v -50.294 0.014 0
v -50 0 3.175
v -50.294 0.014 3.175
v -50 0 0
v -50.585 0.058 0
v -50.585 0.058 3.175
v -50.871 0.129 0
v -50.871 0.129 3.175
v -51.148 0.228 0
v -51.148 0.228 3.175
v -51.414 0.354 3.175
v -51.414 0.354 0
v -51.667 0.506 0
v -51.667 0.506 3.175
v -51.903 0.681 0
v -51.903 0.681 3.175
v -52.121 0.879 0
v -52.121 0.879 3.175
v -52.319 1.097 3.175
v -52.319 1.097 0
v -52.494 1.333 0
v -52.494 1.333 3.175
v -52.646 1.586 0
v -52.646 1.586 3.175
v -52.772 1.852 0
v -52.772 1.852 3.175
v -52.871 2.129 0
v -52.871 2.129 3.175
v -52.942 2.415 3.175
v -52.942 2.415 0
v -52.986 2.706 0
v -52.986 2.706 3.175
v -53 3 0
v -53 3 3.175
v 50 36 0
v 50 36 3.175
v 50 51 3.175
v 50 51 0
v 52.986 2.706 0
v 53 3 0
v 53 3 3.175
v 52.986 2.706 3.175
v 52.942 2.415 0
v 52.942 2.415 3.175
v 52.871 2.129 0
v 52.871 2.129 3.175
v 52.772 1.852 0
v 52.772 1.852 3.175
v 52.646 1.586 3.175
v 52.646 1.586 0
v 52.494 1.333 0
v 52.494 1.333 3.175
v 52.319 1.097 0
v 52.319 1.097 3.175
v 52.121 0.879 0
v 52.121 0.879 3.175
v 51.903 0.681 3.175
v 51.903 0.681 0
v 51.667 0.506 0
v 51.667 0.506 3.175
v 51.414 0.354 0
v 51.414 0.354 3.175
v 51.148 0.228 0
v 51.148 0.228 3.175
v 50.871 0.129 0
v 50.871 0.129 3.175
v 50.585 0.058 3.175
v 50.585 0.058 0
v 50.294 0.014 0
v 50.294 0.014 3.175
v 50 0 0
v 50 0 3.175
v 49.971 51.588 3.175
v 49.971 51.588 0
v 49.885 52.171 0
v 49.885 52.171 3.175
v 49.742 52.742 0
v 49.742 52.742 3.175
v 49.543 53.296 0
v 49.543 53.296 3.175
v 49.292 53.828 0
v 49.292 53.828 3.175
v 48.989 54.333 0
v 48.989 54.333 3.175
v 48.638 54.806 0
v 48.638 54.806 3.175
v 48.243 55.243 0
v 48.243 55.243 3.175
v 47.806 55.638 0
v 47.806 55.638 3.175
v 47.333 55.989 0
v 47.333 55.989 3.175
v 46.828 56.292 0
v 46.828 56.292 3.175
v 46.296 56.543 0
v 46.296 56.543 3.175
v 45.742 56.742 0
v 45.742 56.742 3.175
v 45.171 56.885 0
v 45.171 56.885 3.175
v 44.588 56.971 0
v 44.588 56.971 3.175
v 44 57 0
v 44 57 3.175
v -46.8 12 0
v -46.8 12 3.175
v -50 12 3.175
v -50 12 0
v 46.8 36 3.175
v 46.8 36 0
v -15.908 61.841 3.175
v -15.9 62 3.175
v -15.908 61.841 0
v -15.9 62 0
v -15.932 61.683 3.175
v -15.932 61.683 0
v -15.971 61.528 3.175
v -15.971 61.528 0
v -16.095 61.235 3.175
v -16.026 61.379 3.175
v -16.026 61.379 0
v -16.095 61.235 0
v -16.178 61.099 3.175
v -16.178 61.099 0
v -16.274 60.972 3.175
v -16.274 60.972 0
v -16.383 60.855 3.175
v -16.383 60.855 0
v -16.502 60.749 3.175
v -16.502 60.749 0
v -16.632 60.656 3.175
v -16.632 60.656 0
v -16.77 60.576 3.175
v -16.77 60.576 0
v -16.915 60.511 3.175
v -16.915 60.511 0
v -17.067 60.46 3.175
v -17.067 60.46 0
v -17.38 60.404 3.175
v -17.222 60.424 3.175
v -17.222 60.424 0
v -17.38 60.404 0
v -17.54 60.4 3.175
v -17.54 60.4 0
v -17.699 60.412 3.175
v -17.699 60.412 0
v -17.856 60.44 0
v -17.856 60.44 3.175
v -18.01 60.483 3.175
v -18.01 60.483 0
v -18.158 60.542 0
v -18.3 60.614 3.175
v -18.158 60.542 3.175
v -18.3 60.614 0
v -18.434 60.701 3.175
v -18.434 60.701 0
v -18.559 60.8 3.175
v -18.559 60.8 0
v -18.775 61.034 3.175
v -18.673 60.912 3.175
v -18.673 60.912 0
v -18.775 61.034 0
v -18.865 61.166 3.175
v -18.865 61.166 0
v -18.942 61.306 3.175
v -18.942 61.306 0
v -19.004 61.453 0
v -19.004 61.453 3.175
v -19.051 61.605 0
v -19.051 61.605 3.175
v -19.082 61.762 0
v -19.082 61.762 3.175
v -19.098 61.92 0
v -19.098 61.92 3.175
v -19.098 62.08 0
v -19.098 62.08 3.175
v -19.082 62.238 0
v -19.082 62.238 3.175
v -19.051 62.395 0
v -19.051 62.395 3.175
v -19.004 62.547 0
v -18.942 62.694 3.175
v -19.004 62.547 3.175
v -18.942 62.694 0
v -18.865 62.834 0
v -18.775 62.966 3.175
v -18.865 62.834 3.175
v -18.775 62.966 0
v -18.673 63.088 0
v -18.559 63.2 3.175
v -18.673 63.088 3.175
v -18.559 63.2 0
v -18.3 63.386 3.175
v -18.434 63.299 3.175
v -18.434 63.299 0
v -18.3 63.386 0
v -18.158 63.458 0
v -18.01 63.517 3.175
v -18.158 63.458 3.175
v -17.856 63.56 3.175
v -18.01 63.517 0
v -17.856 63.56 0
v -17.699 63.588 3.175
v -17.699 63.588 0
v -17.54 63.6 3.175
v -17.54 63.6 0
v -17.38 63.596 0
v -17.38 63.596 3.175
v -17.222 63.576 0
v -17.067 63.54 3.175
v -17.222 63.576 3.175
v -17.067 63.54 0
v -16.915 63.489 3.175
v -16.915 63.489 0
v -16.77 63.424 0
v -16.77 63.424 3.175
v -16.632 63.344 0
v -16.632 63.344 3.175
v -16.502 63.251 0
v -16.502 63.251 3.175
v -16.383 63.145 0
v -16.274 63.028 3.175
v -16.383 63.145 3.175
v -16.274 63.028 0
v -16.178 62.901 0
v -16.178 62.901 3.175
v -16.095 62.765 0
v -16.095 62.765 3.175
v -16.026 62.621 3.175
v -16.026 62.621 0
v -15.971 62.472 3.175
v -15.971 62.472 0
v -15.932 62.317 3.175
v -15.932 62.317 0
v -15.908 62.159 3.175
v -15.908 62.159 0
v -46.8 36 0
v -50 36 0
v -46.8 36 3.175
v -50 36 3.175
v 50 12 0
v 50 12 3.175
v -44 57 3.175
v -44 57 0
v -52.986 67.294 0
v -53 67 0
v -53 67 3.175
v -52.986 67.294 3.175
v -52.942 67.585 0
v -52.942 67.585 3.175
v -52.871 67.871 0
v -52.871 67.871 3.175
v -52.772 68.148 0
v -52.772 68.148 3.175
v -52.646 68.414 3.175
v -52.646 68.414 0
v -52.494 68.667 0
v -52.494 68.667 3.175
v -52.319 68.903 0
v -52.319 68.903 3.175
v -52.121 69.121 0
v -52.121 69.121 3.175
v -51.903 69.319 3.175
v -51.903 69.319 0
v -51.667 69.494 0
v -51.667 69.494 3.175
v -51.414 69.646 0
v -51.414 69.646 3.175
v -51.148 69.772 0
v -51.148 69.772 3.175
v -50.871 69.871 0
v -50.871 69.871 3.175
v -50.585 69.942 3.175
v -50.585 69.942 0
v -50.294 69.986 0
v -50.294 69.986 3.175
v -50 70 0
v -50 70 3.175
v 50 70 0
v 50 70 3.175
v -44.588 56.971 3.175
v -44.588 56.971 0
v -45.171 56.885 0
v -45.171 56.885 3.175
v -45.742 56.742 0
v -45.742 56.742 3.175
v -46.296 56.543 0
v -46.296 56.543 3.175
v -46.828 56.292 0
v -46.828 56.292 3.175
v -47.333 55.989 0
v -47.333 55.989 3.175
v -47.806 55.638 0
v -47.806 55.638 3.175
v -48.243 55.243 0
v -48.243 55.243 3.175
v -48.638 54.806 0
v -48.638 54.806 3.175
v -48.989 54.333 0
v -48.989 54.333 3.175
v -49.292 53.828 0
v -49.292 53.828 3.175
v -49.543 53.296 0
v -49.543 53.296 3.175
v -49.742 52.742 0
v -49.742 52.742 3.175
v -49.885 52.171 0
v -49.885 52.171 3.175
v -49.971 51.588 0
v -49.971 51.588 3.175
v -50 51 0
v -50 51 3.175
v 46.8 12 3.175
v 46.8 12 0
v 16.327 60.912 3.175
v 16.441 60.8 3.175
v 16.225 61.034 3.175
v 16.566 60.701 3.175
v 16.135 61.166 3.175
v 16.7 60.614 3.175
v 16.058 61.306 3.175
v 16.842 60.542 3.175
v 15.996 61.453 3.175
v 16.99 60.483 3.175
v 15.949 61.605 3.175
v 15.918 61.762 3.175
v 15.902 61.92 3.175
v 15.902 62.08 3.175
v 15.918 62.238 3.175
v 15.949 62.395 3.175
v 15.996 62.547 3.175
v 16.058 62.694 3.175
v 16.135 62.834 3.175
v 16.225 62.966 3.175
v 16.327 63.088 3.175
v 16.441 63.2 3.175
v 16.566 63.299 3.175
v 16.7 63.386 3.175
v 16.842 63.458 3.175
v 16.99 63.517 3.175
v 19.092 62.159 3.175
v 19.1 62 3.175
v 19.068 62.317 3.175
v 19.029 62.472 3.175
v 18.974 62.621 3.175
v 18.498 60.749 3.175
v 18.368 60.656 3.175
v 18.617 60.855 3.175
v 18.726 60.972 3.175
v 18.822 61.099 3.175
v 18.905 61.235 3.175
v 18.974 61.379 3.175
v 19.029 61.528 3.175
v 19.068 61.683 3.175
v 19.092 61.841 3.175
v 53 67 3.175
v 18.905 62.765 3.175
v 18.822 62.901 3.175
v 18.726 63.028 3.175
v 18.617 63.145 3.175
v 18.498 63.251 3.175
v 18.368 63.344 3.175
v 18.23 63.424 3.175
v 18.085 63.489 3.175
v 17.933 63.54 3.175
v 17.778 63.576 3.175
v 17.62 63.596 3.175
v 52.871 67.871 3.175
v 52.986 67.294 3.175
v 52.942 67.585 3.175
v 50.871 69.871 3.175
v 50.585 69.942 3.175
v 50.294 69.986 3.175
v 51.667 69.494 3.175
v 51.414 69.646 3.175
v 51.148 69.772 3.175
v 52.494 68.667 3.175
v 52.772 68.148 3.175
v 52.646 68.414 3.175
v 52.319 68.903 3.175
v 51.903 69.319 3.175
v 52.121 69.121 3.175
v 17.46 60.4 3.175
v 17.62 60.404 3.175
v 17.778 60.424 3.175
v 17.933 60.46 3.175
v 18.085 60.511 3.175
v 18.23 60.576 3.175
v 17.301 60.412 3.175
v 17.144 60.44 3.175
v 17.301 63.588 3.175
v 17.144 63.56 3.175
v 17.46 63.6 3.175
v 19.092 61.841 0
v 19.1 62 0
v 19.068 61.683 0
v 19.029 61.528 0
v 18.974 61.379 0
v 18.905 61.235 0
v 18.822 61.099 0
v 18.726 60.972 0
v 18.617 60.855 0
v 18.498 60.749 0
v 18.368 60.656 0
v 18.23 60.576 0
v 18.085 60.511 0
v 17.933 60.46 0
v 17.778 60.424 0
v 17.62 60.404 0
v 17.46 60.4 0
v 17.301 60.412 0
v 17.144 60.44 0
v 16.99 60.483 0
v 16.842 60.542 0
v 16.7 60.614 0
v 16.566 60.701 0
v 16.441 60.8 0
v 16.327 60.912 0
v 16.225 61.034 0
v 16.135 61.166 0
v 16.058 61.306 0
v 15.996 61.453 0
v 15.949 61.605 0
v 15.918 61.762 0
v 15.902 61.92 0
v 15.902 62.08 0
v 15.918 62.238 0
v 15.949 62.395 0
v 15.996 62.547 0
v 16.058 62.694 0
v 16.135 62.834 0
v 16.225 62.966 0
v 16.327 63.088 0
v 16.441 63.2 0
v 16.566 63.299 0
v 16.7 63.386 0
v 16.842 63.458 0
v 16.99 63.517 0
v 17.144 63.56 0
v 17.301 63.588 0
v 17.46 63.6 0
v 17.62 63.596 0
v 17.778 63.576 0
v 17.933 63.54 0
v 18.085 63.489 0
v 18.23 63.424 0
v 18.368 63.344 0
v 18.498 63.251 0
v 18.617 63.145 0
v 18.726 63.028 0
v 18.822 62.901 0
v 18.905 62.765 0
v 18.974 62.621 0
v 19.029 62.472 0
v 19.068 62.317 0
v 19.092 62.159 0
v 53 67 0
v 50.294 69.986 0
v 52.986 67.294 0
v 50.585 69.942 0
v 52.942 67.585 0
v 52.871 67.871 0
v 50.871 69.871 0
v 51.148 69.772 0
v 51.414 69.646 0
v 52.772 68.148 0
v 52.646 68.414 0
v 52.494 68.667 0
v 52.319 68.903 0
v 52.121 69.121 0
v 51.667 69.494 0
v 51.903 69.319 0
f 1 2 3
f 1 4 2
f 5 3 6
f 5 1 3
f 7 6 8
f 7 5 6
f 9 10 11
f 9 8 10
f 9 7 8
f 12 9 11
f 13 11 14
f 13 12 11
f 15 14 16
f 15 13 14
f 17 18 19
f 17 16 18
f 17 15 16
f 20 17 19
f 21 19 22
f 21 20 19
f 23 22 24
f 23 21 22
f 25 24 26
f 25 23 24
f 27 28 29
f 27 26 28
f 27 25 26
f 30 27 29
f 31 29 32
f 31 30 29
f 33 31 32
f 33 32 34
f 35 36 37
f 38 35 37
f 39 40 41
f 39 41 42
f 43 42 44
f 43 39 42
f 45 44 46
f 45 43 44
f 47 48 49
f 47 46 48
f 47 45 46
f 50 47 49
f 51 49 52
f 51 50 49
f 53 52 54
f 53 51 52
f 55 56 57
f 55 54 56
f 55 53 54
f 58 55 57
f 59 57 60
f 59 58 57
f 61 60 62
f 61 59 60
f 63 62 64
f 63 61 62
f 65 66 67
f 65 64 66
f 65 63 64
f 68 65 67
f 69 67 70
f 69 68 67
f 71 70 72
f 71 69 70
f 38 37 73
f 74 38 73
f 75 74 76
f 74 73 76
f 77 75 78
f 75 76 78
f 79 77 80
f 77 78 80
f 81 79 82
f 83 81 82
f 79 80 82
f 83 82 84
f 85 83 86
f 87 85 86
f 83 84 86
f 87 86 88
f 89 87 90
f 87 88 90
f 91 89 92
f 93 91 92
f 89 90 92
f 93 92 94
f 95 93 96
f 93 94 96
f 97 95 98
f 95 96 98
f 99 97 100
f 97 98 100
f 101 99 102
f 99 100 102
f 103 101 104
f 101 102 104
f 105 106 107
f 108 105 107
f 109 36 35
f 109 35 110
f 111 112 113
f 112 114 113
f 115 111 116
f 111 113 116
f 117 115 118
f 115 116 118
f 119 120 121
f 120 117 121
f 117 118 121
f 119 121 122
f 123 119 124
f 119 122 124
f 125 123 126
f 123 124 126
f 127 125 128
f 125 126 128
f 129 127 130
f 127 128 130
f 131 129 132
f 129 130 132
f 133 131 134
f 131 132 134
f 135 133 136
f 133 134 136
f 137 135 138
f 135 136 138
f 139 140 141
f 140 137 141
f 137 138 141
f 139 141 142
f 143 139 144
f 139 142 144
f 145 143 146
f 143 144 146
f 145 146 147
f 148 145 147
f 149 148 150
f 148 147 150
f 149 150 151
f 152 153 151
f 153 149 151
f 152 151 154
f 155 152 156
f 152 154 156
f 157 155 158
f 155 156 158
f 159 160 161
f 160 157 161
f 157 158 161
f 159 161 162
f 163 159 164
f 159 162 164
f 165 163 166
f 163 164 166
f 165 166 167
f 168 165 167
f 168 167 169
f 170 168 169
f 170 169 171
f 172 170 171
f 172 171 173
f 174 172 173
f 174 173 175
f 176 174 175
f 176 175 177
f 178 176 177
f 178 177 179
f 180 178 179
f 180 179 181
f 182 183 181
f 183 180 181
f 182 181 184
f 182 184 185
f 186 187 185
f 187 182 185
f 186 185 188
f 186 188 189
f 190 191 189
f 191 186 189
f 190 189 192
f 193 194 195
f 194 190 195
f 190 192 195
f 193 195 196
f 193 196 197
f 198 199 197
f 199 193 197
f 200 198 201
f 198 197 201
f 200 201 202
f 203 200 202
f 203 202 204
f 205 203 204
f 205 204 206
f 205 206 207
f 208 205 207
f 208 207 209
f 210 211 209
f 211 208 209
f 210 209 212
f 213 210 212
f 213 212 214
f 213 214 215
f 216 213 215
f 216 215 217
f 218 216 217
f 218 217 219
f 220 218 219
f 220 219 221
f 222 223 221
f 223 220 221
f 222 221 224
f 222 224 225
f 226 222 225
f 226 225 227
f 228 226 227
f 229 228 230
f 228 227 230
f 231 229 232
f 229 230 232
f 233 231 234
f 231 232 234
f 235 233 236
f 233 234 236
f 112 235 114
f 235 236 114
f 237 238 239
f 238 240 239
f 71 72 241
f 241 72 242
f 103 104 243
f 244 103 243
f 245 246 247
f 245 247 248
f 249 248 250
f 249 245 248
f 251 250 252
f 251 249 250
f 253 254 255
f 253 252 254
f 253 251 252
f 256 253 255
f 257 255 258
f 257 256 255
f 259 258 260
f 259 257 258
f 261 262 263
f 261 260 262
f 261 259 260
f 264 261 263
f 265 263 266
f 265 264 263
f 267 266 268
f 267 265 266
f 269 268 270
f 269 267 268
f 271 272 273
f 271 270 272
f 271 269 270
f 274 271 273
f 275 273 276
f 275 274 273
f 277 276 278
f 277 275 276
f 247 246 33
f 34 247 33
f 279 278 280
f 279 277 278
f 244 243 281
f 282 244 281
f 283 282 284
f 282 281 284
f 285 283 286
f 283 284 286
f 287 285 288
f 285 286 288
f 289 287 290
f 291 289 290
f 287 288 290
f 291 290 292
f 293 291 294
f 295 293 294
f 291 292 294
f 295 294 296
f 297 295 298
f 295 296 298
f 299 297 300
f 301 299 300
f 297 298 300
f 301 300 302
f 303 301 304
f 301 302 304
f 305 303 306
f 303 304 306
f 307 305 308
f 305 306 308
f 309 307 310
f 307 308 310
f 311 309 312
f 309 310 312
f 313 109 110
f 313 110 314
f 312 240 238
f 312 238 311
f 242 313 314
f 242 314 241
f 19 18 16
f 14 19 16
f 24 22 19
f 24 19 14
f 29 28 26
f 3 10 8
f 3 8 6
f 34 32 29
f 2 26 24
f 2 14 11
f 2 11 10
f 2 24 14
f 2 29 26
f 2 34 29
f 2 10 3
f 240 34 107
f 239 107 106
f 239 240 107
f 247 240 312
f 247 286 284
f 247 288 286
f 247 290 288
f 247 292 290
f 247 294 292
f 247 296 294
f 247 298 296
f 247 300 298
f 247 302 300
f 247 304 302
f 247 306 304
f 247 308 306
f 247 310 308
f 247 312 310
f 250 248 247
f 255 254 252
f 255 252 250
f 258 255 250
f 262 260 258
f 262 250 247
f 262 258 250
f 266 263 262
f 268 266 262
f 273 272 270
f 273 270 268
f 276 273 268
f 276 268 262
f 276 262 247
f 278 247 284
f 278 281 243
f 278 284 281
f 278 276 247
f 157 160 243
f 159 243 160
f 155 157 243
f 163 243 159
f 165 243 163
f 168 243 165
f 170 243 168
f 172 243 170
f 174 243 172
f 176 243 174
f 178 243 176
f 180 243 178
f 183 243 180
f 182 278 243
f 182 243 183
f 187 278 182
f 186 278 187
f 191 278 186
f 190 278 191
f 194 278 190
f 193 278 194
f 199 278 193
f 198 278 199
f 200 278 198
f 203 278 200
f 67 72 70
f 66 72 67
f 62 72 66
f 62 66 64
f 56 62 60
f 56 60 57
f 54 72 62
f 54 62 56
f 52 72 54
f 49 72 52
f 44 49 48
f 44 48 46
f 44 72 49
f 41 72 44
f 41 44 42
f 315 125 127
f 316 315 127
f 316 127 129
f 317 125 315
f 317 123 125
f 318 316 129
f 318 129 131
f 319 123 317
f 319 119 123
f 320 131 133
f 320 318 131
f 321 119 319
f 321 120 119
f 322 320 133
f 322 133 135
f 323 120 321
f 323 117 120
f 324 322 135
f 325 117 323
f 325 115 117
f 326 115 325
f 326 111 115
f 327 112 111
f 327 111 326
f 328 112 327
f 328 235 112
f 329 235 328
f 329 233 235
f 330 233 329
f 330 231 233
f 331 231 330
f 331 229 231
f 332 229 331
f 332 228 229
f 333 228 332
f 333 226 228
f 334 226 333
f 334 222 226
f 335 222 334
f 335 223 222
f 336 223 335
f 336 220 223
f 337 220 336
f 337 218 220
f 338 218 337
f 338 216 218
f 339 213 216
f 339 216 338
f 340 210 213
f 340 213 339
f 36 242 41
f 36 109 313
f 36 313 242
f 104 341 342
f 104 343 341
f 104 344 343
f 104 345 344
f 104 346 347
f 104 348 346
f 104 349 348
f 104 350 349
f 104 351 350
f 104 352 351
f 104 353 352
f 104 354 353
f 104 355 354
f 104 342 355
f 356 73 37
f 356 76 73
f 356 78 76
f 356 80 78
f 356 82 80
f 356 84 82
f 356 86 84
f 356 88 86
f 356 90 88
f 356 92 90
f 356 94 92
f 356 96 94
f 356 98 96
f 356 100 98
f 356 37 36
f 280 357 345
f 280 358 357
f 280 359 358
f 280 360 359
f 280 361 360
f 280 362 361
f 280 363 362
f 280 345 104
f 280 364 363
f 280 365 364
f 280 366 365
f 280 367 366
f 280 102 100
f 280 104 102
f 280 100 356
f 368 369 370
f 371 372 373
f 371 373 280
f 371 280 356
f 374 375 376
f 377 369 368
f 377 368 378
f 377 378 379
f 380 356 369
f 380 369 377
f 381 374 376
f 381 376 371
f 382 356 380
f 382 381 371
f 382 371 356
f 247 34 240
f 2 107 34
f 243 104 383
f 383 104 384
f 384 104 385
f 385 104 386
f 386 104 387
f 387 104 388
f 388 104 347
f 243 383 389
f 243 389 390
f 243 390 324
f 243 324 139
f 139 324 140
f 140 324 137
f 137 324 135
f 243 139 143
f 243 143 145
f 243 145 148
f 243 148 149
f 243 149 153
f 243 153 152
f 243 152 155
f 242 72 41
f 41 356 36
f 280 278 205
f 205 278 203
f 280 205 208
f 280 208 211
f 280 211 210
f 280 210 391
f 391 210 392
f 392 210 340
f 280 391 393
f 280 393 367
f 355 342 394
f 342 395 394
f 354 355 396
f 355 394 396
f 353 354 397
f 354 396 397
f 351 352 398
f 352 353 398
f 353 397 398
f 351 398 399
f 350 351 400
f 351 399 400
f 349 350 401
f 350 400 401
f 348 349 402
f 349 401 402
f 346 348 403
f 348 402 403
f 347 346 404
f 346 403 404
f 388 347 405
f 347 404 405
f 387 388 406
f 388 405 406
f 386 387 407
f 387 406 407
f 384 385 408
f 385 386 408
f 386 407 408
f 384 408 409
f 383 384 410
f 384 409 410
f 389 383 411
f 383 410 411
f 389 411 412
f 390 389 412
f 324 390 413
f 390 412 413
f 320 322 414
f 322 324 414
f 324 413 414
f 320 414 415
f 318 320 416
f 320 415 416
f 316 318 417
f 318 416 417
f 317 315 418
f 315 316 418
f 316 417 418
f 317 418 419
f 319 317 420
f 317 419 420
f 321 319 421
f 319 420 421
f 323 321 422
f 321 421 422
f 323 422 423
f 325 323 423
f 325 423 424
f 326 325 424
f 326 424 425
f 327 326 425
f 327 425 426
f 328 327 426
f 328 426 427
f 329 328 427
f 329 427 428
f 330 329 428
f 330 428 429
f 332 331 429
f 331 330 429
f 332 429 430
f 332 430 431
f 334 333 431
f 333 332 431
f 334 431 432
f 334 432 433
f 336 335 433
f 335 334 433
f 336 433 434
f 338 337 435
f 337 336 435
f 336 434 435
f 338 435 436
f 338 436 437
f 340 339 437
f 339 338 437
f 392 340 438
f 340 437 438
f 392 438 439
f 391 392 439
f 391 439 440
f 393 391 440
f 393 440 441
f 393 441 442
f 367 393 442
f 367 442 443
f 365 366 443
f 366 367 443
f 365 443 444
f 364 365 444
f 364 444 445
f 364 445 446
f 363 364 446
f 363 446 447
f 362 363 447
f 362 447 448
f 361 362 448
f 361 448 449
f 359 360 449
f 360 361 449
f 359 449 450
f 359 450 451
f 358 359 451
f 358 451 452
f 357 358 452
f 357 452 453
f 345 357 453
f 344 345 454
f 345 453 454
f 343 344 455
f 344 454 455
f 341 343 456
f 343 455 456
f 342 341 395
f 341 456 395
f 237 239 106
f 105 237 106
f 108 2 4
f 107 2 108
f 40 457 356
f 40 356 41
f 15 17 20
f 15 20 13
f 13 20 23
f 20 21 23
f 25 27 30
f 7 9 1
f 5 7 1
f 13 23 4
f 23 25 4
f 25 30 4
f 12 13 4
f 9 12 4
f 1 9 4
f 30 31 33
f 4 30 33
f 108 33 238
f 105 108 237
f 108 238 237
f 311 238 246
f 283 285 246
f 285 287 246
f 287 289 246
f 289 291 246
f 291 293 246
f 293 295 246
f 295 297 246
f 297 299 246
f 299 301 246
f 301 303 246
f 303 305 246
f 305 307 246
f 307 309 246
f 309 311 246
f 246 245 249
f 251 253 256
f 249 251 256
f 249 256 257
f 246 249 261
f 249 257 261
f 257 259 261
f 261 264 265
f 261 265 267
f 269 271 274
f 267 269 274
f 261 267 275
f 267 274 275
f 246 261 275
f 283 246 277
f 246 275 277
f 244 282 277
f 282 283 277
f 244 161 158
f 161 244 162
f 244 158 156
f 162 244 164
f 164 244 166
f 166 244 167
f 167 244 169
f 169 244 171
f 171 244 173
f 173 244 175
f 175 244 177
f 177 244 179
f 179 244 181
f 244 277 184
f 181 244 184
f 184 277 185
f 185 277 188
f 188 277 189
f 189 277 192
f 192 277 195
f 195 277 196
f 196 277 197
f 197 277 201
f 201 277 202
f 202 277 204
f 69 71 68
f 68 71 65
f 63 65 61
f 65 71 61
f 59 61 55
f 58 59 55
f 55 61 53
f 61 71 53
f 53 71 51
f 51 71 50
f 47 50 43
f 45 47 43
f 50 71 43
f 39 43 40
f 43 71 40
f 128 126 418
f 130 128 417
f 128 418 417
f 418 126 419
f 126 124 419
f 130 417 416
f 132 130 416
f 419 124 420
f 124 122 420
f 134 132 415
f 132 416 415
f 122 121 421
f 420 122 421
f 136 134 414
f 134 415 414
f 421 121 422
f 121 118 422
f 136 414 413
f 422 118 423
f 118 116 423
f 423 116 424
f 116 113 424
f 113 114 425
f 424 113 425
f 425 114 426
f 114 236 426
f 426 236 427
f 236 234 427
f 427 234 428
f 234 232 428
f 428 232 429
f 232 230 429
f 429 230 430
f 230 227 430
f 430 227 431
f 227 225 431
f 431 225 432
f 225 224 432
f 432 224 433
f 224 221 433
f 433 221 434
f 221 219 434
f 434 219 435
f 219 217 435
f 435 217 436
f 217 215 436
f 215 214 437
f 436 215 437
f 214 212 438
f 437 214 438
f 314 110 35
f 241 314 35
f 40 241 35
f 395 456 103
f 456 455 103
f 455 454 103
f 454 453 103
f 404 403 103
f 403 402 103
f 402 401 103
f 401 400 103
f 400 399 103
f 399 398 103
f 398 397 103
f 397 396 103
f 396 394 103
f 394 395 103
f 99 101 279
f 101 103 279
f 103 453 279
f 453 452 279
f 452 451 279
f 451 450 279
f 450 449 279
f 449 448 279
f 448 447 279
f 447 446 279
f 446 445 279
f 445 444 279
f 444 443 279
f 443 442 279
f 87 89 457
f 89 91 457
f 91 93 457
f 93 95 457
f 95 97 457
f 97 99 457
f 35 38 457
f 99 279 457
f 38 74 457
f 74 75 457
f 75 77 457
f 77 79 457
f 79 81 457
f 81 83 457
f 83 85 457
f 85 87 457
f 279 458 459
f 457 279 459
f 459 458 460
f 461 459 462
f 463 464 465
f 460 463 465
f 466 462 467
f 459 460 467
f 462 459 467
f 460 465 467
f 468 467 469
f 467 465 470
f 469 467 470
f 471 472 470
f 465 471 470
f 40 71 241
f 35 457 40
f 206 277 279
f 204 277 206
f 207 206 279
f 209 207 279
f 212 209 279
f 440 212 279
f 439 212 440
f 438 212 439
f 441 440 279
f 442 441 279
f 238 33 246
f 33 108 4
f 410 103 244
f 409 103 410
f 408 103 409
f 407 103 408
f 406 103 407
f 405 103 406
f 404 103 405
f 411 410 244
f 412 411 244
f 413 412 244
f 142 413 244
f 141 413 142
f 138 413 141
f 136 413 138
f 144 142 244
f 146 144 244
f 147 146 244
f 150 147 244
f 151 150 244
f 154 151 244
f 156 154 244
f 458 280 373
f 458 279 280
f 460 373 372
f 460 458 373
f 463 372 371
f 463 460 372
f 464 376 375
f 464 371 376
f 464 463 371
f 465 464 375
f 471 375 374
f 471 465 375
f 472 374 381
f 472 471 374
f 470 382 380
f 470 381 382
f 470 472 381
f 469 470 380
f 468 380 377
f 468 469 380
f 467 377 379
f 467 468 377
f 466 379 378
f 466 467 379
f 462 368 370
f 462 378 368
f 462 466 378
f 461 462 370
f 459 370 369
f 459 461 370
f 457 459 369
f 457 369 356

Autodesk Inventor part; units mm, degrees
ref_plane "YZ Plane" through (0, 0, 0) normal (1, 0, 0) x (0, 1, 0)
ref_plane "XZ Plane" through (0, 0, 0) normal (0, 1, 0) x (-1, 0, 0)
ref_plane "XY Plane" through (0, 0, 0) normal (0, 0, 1) x (1, 0, 0)
sketch "Sketch1" plane through (0, 0, 0) normal (0, 0, 1) x (1, 0, 0)
  line L0 (-50, 70) -> (50, 70)
  line L1 (50, 0) -> (-50, 0)
  line L2 (0, 0) -> (0, 70) construction
  circle A0 centre (-17.5, 62) radius 1.6
  circle A1 centre (17.5, 62) radius 1.6
  arc A2 (-50, 70) -> (-53, 67) centre (-50, 67) ccw
  arc A3 (-53, 3) -> (-50, 0) centre (-50, 3) ccw
  arc A4 (53, 67) -> (50, 70) centre (50, 67) ccw
  arc A5 (50, 0) -> (53, 3) centre (50, 3) ccw
  line L3 (53, 67) -> (53, 3)
  line L4 (53, 20) -> (53, 3)
  line L5 (-53, 67) -> (-53, 3)
  line L6 (-53, 20) -> (-53, 3)
  point P0 (53, 45)
  point P1 (-53, 45)
  dimension "d11" = 70
  dimension "d20" = 3
  dimension "d22" = 3.2
  dimension "d23" = 8
  dimension "d24" = 35
  dimension "d31" = 106
extrude "Extrusion1" add sketch "Sketch1" along normal blind 3.175
sketch "Sketch2" plane through (0, 0, 3.175) normal (0, 0, 1) x (1, 0, 0)
  line L0 (-44, 57) -> (0, 57)
  line L1 (0, 0) -> (0, 57) construction
  line L2 (44, 57) -> (0, 57)
  line L3 (-50, -5) -> (50, -5)
  line L4 (-50, 0) -> (50, 0) construction
  arc A0 (50, 51) -> (44, 57) centre (44, 51) ccw
  arc A1 (-44, 57) -> (-50, 51) centre (-44, 51) ccw
  line L5 (50, 36) -> (46.8, 36)
  line L6 (46.8, 36) -> (46.8, 12)
  line L7 (46.8, 12) -> (50, 12)
  line L8 (-50, 36) -> (-46.8, 36)
  line L9 (-46.8, 36) -> (-46.8, 12)
  line L10 (-46.8, 12) -> (-50, 12)
  line L11 (50, -5) -> (50, 12)
  line L12 (50, 36) -> (50, 51)
  line L13 (-50, -5) -> (-50, 12)
  line L14 (-50, 36) -> (-50, 51)
  point P0 (47.5, 57)
  point P1 (-47.5, 57)
  dimension "d14" = 57
  dimension "d17" = 62
  dimension "d33" = 6
  dimension "d35" = 36
  dimension "d36" = 12
  dimension "d37" = 100
  dimension "d38" = 3.2
extrude "Extrusion2" cut sketch "Sketch2" against normal blind 6
properties part number "shovel"
